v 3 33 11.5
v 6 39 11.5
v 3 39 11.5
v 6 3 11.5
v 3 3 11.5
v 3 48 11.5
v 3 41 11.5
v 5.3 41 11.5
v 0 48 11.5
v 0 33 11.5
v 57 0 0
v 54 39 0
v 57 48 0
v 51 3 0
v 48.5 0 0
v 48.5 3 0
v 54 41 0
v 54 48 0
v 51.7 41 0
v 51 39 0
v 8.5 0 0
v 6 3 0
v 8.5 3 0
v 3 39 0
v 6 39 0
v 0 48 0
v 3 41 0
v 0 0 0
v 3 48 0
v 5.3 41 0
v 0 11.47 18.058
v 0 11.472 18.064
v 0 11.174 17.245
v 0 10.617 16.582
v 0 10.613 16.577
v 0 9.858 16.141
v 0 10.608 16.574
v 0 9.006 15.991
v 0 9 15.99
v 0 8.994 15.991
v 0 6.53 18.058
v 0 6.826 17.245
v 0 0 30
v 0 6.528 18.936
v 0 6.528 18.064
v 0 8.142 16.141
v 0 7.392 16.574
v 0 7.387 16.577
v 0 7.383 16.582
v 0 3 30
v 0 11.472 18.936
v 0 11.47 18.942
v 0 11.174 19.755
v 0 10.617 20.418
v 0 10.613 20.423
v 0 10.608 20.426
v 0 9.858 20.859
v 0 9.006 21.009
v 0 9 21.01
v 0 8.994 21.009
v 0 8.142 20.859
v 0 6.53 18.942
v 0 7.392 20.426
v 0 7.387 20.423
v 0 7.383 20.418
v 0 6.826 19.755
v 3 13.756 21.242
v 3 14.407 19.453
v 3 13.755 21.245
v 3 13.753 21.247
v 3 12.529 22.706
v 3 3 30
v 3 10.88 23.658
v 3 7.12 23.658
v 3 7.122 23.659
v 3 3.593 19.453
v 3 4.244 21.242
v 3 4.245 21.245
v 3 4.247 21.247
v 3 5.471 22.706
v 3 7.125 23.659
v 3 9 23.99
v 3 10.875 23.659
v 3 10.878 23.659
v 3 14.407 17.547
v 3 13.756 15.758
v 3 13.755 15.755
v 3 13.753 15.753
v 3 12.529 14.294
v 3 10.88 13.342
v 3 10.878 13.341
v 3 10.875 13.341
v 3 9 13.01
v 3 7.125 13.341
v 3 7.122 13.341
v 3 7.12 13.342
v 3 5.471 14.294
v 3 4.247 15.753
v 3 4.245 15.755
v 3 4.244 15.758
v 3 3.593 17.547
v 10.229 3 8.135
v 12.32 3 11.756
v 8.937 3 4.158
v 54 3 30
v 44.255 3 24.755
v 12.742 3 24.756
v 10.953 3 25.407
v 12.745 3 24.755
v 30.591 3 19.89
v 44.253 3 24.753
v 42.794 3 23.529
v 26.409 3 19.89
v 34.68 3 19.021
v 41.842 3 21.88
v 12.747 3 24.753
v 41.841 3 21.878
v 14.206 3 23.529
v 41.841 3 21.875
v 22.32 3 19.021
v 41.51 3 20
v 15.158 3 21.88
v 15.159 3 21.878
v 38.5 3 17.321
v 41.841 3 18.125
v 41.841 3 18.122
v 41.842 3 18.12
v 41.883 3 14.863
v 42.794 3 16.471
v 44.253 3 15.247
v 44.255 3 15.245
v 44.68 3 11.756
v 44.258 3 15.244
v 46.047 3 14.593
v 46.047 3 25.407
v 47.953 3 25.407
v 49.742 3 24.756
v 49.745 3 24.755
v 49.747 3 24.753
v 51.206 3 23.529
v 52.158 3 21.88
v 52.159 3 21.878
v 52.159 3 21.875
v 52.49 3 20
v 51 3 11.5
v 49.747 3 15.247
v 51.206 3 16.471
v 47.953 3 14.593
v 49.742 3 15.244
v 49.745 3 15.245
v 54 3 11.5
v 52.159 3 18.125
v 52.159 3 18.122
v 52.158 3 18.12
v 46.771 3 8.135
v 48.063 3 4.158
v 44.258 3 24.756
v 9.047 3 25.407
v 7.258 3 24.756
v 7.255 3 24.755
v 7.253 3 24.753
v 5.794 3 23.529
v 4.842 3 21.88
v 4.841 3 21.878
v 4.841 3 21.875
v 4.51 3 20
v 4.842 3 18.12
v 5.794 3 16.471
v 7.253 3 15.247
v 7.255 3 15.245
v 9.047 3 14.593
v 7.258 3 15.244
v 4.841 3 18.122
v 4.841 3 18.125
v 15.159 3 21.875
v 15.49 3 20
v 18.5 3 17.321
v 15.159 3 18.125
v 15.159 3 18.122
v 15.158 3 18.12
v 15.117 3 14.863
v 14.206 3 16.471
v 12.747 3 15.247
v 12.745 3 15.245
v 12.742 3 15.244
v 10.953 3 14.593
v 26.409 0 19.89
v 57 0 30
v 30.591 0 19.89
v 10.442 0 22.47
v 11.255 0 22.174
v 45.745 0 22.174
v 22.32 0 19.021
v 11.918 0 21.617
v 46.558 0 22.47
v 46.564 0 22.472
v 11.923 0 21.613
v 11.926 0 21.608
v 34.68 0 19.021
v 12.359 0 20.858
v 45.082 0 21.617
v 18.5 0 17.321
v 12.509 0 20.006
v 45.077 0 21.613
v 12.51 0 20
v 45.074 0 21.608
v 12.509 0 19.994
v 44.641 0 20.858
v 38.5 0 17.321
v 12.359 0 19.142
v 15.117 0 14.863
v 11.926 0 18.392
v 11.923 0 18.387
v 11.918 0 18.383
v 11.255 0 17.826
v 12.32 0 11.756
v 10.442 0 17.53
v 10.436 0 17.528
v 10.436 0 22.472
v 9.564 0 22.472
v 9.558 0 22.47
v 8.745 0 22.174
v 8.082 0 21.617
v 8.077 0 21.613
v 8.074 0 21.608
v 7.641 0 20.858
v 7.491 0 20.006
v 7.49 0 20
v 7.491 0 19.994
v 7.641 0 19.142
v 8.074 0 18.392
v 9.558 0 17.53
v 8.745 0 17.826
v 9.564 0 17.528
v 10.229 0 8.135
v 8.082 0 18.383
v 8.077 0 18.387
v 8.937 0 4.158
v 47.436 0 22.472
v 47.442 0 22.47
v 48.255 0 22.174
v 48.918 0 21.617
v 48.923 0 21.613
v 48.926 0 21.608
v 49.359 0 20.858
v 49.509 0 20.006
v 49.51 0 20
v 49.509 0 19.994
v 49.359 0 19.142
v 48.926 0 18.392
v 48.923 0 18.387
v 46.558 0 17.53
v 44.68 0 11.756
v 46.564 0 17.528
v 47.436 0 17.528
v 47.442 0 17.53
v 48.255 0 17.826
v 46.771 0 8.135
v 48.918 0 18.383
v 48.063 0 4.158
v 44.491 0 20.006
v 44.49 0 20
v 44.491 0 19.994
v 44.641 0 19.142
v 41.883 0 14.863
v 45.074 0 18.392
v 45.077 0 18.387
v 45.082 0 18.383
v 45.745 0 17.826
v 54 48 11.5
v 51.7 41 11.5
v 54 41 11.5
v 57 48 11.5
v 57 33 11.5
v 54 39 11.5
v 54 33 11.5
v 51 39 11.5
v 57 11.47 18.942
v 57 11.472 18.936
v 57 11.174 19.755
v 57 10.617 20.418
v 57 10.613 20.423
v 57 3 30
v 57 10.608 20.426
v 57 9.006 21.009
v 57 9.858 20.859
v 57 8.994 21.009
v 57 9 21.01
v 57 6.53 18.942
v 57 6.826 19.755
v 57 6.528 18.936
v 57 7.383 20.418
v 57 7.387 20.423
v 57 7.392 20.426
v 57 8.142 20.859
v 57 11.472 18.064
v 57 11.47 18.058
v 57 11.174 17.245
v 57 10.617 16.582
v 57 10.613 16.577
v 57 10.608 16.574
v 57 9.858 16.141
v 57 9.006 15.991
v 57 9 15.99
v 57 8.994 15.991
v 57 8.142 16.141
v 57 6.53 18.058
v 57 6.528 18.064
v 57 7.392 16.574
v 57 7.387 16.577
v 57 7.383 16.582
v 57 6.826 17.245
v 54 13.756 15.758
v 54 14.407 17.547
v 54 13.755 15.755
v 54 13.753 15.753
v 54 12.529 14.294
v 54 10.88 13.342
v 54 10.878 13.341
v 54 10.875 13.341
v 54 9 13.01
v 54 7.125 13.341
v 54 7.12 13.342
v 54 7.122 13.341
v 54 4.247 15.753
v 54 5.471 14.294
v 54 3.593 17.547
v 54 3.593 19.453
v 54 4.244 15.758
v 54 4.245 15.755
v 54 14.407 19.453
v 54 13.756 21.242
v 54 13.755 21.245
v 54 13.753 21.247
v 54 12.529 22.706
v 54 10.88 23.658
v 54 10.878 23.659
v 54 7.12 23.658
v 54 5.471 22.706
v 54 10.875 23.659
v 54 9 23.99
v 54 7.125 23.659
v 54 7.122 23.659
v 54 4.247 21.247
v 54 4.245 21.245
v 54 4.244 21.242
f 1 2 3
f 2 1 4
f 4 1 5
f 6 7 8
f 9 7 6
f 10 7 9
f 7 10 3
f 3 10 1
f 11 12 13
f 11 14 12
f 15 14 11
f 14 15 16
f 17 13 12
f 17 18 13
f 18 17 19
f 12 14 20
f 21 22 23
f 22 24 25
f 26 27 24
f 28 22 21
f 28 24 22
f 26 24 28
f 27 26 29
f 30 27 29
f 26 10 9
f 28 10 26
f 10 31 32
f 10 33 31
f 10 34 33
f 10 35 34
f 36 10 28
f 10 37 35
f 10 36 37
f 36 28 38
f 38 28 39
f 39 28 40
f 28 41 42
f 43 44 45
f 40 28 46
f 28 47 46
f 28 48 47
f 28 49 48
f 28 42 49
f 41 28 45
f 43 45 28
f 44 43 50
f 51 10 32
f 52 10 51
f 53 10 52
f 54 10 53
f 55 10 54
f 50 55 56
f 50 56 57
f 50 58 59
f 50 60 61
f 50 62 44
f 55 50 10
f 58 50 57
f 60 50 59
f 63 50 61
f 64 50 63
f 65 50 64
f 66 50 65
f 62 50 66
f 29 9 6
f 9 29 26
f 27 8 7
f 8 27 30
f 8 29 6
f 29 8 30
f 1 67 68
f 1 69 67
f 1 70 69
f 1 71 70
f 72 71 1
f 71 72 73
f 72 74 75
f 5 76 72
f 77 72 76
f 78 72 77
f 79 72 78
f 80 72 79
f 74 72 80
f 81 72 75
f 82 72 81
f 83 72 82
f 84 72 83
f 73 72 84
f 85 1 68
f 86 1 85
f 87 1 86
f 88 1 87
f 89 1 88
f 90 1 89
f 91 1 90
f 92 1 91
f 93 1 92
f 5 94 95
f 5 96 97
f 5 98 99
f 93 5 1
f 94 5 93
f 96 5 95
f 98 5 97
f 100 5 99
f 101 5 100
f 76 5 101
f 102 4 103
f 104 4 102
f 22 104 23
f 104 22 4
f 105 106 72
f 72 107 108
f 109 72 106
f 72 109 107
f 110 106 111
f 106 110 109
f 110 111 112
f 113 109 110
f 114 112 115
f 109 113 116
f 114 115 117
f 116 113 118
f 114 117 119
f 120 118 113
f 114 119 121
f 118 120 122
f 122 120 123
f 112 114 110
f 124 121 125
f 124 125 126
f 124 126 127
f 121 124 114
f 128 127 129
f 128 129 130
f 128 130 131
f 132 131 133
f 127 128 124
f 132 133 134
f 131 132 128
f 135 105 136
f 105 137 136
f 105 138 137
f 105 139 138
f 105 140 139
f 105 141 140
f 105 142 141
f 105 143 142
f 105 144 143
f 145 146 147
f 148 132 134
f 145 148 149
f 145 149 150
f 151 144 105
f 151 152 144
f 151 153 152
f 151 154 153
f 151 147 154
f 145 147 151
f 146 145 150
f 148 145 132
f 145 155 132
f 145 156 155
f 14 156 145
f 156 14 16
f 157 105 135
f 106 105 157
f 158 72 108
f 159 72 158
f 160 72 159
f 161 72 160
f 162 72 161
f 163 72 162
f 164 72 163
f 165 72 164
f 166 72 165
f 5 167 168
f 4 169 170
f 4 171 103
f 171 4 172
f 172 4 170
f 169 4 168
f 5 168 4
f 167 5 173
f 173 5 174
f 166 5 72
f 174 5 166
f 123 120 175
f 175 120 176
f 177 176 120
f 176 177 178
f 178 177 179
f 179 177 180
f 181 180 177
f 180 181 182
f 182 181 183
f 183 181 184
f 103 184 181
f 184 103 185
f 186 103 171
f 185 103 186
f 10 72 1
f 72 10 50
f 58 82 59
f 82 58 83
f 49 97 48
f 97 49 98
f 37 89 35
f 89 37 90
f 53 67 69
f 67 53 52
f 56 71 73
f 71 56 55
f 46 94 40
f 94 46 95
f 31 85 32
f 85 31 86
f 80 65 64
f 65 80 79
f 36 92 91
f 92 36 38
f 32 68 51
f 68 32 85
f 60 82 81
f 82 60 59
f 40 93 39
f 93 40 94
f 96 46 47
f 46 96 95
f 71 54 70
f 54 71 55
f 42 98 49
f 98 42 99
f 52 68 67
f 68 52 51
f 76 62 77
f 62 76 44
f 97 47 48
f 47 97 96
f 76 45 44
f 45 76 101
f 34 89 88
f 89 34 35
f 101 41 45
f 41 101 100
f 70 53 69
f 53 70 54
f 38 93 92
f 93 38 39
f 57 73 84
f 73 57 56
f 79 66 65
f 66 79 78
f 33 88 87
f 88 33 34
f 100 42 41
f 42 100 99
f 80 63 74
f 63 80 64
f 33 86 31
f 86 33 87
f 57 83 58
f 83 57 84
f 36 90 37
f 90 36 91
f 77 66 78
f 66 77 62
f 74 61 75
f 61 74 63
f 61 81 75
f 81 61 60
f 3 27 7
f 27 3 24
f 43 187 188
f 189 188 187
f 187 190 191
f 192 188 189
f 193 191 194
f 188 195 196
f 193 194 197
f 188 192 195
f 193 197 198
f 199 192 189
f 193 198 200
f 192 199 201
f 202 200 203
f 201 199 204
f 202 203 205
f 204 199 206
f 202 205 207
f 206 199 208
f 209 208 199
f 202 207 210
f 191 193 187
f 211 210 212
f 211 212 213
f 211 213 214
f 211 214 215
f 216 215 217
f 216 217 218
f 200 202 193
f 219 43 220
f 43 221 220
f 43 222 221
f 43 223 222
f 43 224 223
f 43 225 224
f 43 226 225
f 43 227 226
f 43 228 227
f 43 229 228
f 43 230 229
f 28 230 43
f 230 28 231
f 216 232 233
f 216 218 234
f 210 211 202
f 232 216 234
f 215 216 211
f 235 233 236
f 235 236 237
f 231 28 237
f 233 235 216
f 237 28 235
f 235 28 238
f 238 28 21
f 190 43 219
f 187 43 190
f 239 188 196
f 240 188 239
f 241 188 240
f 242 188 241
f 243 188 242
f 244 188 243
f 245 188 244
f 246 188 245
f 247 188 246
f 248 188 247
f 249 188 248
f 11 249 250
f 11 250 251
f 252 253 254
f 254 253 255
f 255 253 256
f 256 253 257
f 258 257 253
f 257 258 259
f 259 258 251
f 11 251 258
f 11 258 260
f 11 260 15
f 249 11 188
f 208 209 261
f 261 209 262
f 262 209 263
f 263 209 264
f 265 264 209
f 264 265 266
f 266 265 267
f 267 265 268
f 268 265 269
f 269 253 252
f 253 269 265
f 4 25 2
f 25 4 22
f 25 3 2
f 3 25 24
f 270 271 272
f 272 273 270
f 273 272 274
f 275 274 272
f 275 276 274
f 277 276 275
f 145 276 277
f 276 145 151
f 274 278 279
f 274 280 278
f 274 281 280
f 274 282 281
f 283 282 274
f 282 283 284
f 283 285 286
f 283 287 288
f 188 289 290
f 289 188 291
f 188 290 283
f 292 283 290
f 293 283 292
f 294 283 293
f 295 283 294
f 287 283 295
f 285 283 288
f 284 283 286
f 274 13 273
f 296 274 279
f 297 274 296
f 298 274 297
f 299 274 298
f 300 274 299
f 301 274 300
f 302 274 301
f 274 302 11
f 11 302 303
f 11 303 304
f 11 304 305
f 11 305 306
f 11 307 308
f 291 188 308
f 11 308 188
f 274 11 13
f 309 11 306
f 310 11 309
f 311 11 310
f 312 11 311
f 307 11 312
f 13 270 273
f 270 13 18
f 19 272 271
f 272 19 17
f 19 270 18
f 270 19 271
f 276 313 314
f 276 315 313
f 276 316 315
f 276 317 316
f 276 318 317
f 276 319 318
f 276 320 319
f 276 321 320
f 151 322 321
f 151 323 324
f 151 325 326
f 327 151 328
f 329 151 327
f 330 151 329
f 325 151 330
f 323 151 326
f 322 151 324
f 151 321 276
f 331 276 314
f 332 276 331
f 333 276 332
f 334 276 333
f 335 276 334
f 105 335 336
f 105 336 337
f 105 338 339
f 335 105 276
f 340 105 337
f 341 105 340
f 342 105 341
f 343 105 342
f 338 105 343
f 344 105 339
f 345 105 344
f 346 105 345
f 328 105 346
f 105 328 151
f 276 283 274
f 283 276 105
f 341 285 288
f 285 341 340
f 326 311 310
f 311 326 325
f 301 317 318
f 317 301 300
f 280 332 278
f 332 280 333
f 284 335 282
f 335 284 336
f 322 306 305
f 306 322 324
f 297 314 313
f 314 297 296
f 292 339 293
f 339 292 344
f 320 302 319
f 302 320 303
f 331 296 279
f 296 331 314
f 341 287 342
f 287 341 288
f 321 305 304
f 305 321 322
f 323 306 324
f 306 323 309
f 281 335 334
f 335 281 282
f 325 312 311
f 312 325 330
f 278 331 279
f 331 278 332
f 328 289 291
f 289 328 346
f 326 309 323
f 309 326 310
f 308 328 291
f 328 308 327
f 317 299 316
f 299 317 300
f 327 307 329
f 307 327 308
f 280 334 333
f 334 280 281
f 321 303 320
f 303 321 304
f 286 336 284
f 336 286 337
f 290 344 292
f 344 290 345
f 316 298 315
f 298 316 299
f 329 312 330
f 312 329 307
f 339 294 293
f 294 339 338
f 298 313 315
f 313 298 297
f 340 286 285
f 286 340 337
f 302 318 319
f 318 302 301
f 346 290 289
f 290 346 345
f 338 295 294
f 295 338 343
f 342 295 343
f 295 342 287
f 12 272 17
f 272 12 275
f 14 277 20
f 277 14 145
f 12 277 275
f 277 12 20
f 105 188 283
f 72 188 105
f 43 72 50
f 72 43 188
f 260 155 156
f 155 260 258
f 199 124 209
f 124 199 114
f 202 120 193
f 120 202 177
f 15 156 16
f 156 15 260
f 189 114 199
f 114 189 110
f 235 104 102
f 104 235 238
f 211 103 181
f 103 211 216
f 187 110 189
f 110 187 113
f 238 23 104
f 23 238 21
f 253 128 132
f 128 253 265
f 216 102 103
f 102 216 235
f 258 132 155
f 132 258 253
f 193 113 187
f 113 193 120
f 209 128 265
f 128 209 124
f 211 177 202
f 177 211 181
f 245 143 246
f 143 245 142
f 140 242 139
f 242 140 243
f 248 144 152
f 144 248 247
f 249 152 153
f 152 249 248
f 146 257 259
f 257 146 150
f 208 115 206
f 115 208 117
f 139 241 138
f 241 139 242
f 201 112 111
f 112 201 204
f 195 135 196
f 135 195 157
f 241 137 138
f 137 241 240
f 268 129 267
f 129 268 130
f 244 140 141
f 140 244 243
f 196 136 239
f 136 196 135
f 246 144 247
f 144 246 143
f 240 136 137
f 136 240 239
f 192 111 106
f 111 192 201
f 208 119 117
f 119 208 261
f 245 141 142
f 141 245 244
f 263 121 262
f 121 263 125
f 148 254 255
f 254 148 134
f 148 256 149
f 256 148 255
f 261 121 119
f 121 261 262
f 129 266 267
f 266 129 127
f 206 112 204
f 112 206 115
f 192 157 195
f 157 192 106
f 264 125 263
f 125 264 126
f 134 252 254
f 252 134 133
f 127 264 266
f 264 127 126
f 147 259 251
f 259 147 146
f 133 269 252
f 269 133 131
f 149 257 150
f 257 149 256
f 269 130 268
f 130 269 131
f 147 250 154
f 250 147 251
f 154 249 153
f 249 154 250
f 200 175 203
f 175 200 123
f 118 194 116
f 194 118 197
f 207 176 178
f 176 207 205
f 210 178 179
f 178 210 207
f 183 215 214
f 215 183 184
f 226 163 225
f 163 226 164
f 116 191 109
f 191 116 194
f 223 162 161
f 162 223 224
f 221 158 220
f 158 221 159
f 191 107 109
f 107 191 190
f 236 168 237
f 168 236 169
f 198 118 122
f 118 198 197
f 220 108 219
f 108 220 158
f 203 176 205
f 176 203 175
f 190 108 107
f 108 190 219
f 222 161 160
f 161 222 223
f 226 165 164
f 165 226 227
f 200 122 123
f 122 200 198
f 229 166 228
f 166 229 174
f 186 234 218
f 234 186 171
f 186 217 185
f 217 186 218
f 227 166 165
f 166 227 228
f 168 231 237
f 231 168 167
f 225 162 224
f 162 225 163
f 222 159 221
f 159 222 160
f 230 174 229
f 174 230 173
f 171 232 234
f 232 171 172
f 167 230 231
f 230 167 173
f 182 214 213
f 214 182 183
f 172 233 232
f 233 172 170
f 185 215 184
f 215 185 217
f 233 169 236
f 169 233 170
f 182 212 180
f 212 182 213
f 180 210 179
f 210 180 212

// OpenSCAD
module latch(
  length, width, height, latch_width, latch_height, slot_width, 
  support_length, back_height
) {
    // this is on its side, so the width goes into +X,
    // height goes into +Y, and length goes into +Z
    support_height=back_height-length;
    cube([width, height, length]);
    cube([width*2, height-(latch_height+slot_width), length]);
    translate([0, height-latch_height, 0]) difference() {
        cube([width+latch_width, latch_height, length]);
        translate([width+latch_width, 0, -0.01])
         rotate([0, 0, atan2(latch_width, latch_height)]) 
         cube([latch_width, sqrt(pow(latch_width,2) + pow(latch_height,2)), length+0.02]);
    };
    translate([width, width, length]) rotate([0, -90, 0]) difference() {
          linear_extrude(height=width, center=false, convexity=1, twist=0)
          polygon(points=[[0, 0], [0, support_length], [support_height, 0]]);
        // countersunk screw holes
        translate([7, 6, -0.01]) rotate([0, 0, 0])
          cylinder(h=3+0.02, d1=5+(3*2), d2=5);
    }
}

latch(11.5, 3, 48, 2.3, 7, 2, 30, 30);
translate([57, 0, 0]) mirror([1, 0, 0]) latch(11.5, 3, 48, 2.3, 7, 2, 30, 30);
difference() {
    cube([57, 3, 30]);
    // cutout for cables
    translate([57/2, -0.01, 0]) rotate([-90, 0, 0]) 
      cylinder(h=3+0.02, r=20);
    // countersunk screw holes
    translate([57-10, -0.01, 20]) rotate([-90, 0, 0])
      cylinder(h=3+0.02, d1=5, d2=5+(3*2));
    translate([+10, -0.01, 20]) rotate([-90, 0, 0])
      cylinder(h=3+0.02, d1=5, d2=5+(3*2));
}
